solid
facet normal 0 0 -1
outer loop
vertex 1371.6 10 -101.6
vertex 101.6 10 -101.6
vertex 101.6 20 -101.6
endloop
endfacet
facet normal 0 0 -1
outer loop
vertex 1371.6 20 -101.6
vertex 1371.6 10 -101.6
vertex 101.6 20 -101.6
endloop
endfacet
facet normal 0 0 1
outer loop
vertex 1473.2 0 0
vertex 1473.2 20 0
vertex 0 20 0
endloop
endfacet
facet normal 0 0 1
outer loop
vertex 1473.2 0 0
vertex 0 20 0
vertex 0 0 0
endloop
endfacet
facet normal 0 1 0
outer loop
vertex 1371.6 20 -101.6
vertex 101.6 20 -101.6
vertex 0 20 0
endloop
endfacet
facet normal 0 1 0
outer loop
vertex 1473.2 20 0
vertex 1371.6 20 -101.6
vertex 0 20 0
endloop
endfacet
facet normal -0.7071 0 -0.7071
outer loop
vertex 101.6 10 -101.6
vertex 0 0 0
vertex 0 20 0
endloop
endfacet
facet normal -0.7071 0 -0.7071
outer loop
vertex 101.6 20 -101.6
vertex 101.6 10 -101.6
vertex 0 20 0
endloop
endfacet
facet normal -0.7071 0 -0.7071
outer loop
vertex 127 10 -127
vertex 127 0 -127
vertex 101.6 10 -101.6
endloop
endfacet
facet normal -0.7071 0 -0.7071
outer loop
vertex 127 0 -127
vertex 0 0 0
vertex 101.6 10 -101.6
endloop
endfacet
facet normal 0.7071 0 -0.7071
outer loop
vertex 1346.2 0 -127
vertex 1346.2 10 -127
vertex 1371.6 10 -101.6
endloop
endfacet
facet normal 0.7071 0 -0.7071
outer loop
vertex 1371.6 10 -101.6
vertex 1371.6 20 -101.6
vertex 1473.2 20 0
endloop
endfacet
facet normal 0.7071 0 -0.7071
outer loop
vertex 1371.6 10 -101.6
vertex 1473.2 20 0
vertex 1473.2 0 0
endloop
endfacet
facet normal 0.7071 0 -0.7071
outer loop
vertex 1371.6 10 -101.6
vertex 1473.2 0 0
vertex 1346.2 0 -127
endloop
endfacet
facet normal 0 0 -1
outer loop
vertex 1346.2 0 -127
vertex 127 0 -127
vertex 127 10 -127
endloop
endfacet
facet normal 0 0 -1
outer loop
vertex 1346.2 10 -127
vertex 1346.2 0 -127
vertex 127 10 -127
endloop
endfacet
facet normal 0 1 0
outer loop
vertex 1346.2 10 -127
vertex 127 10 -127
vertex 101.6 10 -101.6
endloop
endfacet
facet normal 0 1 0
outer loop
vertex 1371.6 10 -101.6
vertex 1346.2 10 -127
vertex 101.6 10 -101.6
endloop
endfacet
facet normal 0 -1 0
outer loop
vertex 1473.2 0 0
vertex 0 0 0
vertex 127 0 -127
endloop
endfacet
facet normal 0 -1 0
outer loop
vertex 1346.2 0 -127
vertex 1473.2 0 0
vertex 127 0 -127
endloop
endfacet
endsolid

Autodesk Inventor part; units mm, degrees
ref_plane "YZ Plane" through (0, 0, 0) normal (1, 0, 0) x (0, 1, 0)
ref_plane "XZ Plane" through (0, 0, 0) normal (0, 1, 0) x (-1, 0, 0)
ref_plane "XY Plane" through (0, 0, 0) normal (0, 0, 1) x (1, 0, 0)
sketch "Sketch1" plane through (0, 0, 0) normal (1, 0, 0) x (0, 1, 0)
  line L0 (0, 0) -> (0, -127)
  line L1 (0, -127) -> (10, -127)
  line L2 (10, -127) -> (10, -101.6)
  line L3 (10, -101.6) -> (20, -101.6)
  line L4 (20, -101.6) -> (20, 0)
  line L5 (20, 0) -> (0, 0)
  dimension "d0" = 127
  dimension "d1" = 10
  dimension "d2" = 25.4
  dimension "d3" = 10
extrude "Extrusion1" add sketch "Sketch1" along normal blind 1473.2
chamfer "Chamfer1" distance 127 angle 45 1 edges at (1473.2, 5, -127)
chamfer "Chamfer2" distance 127 angle 45 1 edges at (0, 5, -127)
properties part number "SkirtLength" material "Wood (Birch)"
